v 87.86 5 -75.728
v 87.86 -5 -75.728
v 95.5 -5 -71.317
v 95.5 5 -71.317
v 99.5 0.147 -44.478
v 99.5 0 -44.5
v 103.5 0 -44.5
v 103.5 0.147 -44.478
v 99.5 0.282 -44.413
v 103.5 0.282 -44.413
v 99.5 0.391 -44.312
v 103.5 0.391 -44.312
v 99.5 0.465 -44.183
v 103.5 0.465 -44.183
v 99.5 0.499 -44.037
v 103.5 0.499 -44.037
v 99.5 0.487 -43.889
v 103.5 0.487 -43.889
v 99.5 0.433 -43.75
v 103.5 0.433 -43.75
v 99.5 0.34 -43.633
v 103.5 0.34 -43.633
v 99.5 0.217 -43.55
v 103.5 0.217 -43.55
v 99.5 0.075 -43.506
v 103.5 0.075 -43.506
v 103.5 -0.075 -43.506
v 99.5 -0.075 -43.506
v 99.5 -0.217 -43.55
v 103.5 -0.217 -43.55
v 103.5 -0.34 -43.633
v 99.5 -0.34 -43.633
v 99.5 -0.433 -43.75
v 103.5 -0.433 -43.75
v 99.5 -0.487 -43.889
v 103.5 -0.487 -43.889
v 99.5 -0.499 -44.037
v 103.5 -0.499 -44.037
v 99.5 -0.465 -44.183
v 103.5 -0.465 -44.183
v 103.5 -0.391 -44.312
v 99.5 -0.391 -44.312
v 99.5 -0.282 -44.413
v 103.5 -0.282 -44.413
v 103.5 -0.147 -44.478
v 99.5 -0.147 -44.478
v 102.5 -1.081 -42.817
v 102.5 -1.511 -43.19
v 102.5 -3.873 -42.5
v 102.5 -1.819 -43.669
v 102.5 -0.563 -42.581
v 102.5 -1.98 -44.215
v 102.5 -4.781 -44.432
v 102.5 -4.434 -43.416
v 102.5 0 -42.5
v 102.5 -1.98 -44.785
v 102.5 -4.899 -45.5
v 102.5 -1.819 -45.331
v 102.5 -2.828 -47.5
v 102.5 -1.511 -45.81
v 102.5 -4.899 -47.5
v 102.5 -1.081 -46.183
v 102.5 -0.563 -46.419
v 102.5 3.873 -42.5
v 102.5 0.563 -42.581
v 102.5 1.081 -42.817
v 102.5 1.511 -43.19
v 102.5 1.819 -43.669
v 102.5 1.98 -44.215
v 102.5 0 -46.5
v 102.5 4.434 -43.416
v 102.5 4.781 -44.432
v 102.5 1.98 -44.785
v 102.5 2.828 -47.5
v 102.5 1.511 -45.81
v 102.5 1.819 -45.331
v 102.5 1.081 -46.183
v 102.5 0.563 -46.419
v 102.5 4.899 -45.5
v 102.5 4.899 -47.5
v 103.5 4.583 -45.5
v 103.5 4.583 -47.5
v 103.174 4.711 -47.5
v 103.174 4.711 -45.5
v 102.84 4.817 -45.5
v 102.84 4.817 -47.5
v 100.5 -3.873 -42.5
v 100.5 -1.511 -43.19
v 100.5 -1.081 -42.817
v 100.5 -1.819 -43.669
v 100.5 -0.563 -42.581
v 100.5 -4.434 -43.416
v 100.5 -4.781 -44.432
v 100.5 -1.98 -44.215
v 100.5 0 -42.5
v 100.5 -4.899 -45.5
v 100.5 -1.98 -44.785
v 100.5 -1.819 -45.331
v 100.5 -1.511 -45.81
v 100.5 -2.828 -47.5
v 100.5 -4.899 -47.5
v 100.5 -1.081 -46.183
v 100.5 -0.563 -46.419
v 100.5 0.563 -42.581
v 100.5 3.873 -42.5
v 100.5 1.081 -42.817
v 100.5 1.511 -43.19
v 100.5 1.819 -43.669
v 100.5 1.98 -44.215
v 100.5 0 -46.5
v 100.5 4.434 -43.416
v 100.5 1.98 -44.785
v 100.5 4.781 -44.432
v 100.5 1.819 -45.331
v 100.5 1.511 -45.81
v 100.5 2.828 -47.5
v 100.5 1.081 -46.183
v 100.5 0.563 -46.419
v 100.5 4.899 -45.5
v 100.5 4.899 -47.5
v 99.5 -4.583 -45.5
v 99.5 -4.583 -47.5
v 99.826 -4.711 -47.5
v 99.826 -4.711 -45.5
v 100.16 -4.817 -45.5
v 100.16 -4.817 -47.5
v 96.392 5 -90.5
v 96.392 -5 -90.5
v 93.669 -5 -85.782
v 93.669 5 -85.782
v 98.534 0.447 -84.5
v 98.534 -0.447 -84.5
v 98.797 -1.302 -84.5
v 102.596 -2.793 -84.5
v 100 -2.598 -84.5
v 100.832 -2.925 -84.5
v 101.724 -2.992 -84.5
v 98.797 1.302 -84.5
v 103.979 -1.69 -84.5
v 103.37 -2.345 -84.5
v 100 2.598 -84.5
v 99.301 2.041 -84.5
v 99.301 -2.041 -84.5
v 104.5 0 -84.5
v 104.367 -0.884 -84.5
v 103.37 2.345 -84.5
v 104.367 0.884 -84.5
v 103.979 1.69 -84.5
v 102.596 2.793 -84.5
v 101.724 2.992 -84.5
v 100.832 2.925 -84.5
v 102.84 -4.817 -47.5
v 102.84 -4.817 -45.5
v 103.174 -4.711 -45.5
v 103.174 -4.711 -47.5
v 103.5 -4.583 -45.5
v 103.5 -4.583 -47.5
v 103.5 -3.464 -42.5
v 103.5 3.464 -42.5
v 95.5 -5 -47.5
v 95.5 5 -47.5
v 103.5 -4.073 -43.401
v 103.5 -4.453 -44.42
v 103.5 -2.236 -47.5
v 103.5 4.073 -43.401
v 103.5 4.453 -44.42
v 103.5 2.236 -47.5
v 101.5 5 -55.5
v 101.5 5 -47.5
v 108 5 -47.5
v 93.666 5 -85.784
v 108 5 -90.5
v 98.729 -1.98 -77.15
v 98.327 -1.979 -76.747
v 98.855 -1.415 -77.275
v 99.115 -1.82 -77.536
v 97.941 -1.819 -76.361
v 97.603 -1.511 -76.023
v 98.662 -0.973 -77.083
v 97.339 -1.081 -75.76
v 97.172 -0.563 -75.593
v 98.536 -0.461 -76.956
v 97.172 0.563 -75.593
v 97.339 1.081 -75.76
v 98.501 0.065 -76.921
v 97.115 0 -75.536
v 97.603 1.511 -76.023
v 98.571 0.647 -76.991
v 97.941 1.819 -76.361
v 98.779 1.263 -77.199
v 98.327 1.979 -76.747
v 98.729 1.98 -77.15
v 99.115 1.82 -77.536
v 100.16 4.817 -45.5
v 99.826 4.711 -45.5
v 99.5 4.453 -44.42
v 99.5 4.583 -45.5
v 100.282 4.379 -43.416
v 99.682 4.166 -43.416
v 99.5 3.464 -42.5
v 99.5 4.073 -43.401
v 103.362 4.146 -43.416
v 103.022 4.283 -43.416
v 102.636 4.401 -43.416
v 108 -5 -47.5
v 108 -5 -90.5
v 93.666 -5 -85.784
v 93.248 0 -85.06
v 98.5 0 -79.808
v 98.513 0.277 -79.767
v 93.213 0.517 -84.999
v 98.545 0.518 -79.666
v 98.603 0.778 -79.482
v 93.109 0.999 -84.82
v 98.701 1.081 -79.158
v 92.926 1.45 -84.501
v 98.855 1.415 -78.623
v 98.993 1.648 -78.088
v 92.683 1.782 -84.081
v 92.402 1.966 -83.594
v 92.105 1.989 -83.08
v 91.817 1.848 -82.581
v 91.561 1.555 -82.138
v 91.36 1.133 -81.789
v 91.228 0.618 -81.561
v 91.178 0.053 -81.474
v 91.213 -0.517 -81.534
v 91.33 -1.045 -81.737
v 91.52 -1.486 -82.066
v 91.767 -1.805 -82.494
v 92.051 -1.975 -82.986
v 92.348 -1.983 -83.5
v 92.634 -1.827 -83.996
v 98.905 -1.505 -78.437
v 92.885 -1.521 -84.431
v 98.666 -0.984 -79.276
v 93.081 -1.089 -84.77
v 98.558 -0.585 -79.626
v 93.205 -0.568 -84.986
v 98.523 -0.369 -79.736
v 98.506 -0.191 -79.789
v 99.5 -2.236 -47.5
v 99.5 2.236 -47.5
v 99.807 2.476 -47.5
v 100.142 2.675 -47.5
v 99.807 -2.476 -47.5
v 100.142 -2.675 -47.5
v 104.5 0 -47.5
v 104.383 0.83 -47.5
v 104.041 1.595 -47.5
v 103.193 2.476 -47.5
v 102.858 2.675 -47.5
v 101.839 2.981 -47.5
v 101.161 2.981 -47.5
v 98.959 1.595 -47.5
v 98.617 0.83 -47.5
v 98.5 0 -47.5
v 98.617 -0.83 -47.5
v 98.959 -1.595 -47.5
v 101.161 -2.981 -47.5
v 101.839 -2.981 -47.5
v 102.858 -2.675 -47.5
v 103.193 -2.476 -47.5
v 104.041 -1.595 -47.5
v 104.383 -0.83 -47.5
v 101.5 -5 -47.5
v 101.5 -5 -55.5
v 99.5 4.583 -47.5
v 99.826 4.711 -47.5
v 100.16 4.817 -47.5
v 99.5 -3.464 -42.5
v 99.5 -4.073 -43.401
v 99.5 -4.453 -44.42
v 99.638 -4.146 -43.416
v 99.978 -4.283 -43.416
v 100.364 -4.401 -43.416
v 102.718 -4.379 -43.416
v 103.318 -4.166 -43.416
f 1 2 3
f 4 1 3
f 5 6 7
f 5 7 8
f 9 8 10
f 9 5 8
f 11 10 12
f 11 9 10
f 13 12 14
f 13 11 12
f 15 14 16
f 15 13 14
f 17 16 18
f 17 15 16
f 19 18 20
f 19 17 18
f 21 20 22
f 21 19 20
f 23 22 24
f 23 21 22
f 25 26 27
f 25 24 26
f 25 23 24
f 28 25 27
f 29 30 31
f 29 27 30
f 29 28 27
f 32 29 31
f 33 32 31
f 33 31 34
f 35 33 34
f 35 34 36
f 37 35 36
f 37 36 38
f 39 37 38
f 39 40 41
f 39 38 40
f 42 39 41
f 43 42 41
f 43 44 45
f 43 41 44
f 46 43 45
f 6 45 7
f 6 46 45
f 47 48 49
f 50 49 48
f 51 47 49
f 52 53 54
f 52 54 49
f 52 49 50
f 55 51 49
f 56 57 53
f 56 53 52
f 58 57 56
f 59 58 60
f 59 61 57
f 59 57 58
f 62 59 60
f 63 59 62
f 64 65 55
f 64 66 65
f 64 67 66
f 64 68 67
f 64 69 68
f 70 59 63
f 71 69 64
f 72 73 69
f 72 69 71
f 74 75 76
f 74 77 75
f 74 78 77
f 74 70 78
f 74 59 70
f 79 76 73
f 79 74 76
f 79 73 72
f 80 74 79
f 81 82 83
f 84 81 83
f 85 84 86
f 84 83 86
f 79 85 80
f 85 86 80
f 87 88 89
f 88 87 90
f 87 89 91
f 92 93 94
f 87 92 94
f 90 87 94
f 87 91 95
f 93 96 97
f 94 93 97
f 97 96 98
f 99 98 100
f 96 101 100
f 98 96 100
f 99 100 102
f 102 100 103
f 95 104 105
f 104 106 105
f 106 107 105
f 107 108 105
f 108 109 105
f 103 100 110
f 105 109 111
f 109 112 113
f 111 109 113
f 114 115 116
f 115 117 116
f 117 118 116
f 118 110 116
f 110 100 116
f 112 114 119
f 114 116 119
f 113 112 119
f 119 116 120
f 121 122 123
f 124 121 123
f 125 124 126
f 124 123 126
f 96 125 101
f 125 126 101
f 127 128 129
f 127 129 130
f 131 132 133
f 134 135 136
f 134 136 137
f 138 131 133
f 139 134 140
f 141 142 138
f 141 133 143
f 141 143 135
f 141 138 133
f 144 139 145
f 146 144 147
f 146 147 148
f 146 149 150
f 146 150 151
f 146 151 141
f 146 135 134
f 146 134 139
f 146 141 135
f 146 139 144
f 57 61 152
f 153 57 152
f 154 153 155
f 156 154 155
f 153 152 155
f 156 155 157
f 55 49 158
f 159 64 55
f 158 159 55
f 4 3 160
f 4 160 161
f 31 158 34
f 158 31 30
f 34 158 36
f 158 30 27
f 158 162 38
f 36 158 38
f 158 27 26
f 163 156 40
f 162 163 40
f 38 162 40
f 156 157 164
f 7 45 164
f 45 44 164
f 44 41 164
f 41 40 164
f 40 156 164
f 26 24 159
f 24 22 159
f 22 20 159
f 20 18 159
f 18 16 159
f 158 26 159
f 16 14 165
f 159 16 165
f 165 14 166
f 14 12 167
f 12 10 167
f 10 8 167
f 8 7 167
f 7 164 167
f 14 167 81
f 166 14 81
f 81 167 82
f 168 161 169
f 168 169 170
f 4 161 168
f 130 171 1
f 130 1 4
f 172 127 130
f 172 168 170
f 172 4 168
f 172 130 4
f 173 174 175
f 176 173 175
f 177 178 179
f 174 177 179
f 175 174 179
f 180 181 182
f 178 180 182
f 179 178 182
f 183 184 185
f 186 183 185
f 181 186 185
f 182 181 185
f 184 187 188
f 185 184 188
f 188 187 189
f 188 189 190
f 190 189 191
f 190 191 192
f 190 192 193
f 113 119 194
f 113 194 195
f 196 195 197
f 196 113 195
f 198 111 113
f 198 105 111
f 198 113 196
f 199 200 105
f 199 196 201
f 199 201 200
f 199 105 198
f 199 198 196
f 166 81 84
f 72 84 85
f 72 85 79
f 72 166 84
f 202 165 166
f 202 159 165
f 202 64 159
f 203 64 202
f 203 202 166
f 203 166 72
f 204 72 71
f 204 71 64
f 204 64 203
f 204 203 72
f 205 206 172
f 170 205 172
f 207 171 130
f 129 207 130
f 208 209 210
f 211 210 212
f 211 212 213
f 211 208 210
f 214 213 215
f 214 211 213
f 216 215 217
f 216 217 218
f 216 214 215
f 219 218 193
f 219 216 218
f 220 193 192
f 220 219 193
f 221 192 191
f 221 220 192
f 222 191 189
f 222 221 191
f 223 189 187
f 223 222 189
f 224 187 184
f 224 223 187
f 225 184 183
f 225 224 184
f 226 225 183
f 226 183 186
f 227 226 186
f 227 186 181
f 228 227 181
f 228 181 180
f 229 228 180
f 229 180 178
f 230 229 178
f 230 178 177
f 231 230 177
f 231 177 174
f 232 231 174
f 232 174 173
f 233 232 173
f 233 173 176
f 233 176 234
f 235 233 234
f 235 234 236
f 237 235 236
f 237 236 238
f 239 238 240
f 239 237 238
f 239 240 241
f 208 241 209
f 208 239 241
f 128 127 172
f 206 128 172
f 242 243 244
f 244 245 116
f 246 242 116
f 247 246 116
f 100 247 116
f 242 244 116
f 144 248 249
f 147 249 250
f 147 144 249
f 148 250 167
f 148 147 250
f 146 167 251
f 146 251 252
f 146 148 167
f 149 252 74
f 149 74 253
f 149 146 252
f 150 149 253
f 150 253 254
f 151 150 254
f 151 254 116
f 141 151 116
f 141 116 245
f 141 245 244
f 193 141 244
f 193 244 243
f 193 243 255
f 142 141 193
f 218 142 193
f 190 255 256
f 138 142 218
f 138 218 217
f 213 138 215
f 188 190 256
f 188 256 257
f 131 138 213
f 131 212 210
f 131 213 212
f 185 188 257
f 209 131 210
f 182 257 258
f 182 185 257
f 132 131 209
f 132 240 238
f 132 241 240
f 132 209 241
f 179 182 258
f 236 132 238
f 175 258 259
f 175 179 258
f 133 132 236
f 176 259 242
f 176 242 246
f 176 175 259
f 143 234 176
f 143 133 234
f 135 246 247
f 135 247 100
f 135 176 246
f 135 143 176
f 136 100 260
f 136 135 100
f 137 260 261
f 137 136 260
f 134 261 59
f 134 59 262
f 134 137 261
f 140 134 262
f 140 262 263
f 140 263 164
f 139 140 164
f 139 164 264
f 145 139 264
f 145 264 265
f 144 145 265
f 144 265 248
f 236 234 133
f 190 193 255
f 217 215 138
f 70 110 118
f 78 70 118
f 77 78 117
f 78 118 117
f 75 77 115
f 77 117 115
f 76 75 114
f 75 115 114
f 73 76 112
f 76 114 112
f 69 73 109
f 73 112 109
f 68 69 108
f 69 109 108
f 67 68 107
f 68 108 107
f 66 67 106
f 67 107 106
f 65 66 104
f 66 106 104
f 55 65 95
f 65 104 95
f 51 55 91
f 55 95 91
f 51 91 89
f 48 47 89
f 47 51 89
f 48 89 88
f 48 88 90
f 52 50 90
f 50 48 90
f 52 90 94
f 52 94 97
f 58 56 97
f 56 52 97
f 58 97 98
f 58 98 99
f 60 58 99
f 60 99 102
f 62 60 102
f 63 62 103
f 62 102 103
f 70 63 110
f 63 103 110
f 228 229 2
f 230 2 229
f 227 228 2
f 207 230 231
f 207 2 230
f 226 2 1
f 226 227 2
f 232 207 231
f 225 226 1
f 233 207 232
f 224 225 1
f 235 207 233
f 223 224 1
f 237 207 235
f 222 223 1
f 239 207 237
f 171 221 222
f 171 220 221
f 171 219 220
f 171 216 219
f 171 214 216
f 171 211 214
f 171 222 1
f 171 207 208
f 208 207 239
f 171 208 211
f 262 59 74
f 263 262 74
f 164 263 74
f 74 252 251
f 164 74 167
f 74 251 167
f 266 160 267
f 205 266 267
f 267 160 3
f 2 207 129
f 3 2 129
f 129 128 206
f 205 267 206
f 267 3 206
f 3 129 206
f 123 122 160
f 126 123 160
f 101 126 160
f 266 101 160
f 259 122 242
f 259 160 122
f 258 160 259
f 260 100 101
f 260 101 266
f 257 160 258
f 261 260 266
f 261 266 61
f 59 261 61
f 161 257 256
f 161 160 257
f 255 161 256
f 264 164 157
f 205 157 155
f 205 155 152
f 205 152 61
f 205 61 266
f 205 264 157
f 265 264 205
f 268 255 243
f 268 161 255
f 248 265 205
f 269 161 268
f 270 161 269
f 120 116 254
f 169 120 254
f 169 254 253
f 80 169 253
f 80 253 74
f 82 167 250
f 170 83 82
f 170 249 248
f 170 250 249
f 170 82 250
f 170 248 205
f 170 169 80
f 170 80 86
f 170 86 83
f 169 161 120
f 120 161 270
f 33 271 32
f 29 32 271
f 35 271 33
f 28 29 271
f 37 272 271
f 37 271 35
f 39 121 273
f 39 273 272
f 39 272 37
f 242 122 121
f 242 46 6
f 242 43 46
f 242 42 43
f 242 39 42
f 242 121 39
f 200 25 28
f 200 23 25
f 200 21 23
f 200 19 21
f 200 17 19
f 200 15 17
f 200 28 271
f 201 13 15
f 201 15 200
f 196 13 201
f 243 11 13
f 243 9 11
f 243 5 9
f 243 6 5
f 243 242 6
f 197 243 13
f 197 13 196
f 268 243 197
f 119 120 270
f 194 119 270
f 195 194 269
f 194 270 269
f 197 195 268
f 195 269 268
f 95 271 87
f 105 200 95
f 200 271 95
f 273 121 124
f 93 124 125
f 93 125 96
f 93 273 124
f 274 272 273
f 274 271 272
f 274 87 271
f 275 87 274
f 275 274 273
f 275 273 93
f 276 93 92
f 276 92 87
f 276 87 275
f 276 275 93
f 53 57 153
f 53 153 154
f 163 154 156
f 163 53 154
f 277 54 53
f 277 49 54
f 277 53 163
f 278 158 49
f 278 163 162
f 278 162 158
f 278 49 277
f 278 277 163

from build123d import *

# Parameters (mm, degrees)
CYLINDER259_R               = 2
CYLINDER259_DEPTH           = 10
CYLINDER259_PLACEMENT_ANGLE = 45
CYLINDER258_R               = 3
CYLINDER258_DEPTH           = 37
CYLINDER254_R               = 0.5
CYLINDER254_DEPTH           = 10
CYLINDER253_R               = 2
CYLINDER253_DEPTH           = 4
CYLINDER257_R               = 3
CYLINDER257_DEPTH           = 10
BOX138_W                    = 10
BOX138_H                    = 10
BOX138_DEPTH                = 10
BOX136_W                    = 2
BOX136_H                    = 10
BOX136_DEPTH                = 10
BOX137_W                    = 10
BOX137_H                    = 10
BOX137_DEPTH                = 10
CYLINDER256_R               = 5
CYLINDER256_DEPTH           = 10
CYLINDER255_R               = 5
CYLINDER255_DEPTH           = 10
BOX133_W                    = 10
BOX133_H                    = 10
BOX133_DEPTH                = 20
BOX133_PLACEMENT_ANGLE      = 30
BOX134_W                    = 12
BOX134_H                    = 10
BOX134_DEPTH                = 17
BOX134_PLACEMENT_ANGLE      = 30
BOX135_W                    = 12.5
BOX135_H                    = 10
BOX135_DEPTH                = 43


with BuildPart() as cylinder259:
    # Cylinder259 → Cylinder259 (new body)
    with BuildSketch(Plane.XY):
        Circle(CYLINDER259_R)
    extrude(amount=CYLINDER259_DEPTH)


with BuildPart() as cylinder259_1:
    # Cylinder259 placement: moved
    add(cylinder259.part.moved(Location((-62.041631, 0, -84.020815))).rotate(Axis((-62.041631, 0, -84.020815), (0, 1, 0)), CYLINDER259_PLACEMENT_ANGLE))


with BuildPart() as cylinder258:
    # Cylinder258 → Cylinder258 (new body)
    with BuildSketch(Plane(origin=(-52, 0, -84.5), x_dir=(1, 0, 0), z_dir=(0, 0, 1))):
        Circle(CYLINDER258_R)
    extrude(amount=CYLINDER258_DEPTH)


with BuildPart() as cylinder254:
    # Cylinder254 → Cylinder254 (new body)
    with BuildSketch(Plane(origin=(-5, 0, -7), x_dir=(0, 0, -1), z_dir=(1, 0, 0))):
        Circle(CYLINDER254_R)
    extrude(amount=CYLINDER254_DEPTH)


with BuildPart() as cylinder253:
    # Cylinder253 → Cylinder253 (new body)
    with BuildSketch(Plane(origin=(-2, -50, 1), x_dir=(0, 0, -1), z_dir=(1, 0, 0))):
        Circle(CYLINDER253_R)
    extrude(amount=CYLINDER253_DEPTH)


with BuildPart() as cylinder257:
    # Cylinder257 → Cylinder257 (new body)
    with BuildSketch(Plane(origin=(0, -50, -12), x_dir=(1, 0, 0), z_dir=(0, 0, 1))):
        Circle(CYLINDER257_R)
    extrude(amount=CYLINDER257_DEPTH)


with BuildPart() as cube138:
    # Box138 → Box138 (new body)
    with BuildSketch(Plane(origin=(-12, -55, -2), x_dir=(1, 0, 0), z_dir=(0, 0, 1))):
        with Locations((5, 5)):
            Rectangle(BOX138_W, BOX138_H)
    extrude(amount=BOX138_DEPTH)


with BuildPart() as cube136:
    # Box136 → Box136 (new body)
    with BuildSketch(Plane(origin=(-1, -55, -2), x_dir=(1, 0, 0), z_dir=(0, 0, 1))):
        with Locations((1, 5)):
            Rectangle(BOX136_W, BOX136_H)
    extrude(amount=BOX136_DEPTH)


with BuildPart() as cube137:
    # Box137 → Box137 (new body)
    with BuildSketch(Plane(origin=(2, -55, -2), x_dir=(1, 0, 0), z_dir=(0, 0, 1))):
        with Locations((5, 5)):
            Rectangle(BOX137_W, BOX137_H)
    extrude(amount=BOX137_DEPTH)


with BuildPart() as cylinder256:
    # Cylinder256 → Cylinder256 (new body)
    with BuildSketch(Plane(origin=(0, -50, -10), x_dir=(1, 0, 0), z_dir=(0, 0, 1))):
        Circle(CYLINDER256_R)
    extrude(amount=CYLINDER256_DEPTH)


with BuildPart() as sphere049:
    # Sphere049 → Sphere049 (revolve)
    with BuildSketch(Plane.XZ.offset(50)):
        with BuildLine():
            ThreePointArc((5, 0), (3.535534, 3.535534), (0, 5))
            Line((0, 5), (0, 0))
            Line((0, 0), (5, 0))
        make_face()
    revolve(axis=Axis((0, -50, 0), (0, 0, 1)))


with BuildPart() as cut204006062:
    # Cylinder255 → Cylinder255 (new body)
    with BuildSketch(Plane(origin=(0, -50, -7), x_dir=(1, 0, 0), z_dir=(0, 0, 1))):
        Circle(CYLINDER255_R)
    extrude(amount=CYLINDER255_DEPTH)

    # Common042: intersect Sphere049
    add(sphere049.part, mode=Mode.INTERSECT)

    # Fusion005077020026: union Cylinder256
    add(cylinder256.part)

    # Cut204006061: cut Cube137
    add(cube137.part, mode=Mode.SUBTRACT)

    # Cut204006063: cut Cube136
    add(cube136.part, mode=Mode.SUBTRACT)

    # Cut204006064: cut Cube138
    add(cube138.part, mode=Mode.SUBTRACT)

    # Cut204006060: cut Cylinder257
    add(cylinder257.part, mode=Mode.SUBTRACT)

    # Fusion005077020025: union Cylinder253
    add(cylinder253.part)


with BuildPart() as cut204006062_1:
    # Fusion005077020027 placement: moved
    add(cut204006062.part.moved(Location((0, 50, -8.5))))

    # Cut204006062: cut Cylinder254
    add(cylinder254.part, mode=Mode.SUBTRACT)


with BuildPart() as cut204006062_2:
    # Cut204006062 placement: moved
    add(cut204006062_1.part.moved(Location((-52, 0, -37))))


with BuildPart() as cube133:
    # Box133 → Box133 (new body)
    with BuildSketch(Plane.XY):
        with Locations((5, 5)):
            Rectangle(BOX133_W, BOX133_H)
    extrude(amount=BOX133_DEPTH)


with BuildPart() as cube133_1:
    # Box133 placement: moved
    add(cube133.part.moved(Location((-168.49167, -5, -108.102886))).rotate(Axis((-168.49167, -5, -108.102886), (0, -1, 0)), BOX133_PLACEMENT_ANGLE))


with BuildPart() as cube134:
    # Box134 → Box134 (new body)
    with BuildSketch(Plane.XY):
        with Locations((6, 5)):
            Rectangle(BOX134_W, BOX134_H)
    extrude(amount=BOX134_DEPTH)


with BuildPart() as cube134_1:
    # Box134 placement: moved
    add(cube134.part.moved(Location((-167.14, -5, -90.45))).rotate(Axis((-167.14, -5, -90.45), (0, -1, 0)), BOX134_PLACEMENT_ANGLE))


with BuildPart() as cut204006066:
    # Box135 → Box135 (new body)
    with BuildSketch(Plane(origin=(-168, -5, -90.5), x_dir=(1, 0, 0), z_dir=(0, 0, 1))):
        with Locations((6.25, 5)):
            Rectangle(BOX135_W, BOX135_H)
    extrude(amount=BOX135_DEPTH)

    # Fusion005077020024: union Cube134
    add(cube134_1.part)

    # Cut204006058: cut Cube133
    add(cube133_1.part, mode=Mode.SUBTRACT)


with BuildPart() as cut204006066_1:
    # Cut204006059 placement: moved
    add(cut204006066.part.moved(Location((110, 0, 0))))

    # Fusion005077020028: union Cut204006062
    add(cut204006062_2.part)

    # Cut204006065: cut Cylinder258
    add(cylinder258.part, mode=Mode.SUBTRACT)

    # Cut204006066: cut Cylinder259
    add(cylinder259_1.part, mode=Mode.SUBTRACT)


with BuildPart() as cut204006066_2:
    # Cut204006066 placement: moved
    add(cut204006066_1.part.moved(Location((153.5, 0, 0))))


solid = cut204006066_2.part
